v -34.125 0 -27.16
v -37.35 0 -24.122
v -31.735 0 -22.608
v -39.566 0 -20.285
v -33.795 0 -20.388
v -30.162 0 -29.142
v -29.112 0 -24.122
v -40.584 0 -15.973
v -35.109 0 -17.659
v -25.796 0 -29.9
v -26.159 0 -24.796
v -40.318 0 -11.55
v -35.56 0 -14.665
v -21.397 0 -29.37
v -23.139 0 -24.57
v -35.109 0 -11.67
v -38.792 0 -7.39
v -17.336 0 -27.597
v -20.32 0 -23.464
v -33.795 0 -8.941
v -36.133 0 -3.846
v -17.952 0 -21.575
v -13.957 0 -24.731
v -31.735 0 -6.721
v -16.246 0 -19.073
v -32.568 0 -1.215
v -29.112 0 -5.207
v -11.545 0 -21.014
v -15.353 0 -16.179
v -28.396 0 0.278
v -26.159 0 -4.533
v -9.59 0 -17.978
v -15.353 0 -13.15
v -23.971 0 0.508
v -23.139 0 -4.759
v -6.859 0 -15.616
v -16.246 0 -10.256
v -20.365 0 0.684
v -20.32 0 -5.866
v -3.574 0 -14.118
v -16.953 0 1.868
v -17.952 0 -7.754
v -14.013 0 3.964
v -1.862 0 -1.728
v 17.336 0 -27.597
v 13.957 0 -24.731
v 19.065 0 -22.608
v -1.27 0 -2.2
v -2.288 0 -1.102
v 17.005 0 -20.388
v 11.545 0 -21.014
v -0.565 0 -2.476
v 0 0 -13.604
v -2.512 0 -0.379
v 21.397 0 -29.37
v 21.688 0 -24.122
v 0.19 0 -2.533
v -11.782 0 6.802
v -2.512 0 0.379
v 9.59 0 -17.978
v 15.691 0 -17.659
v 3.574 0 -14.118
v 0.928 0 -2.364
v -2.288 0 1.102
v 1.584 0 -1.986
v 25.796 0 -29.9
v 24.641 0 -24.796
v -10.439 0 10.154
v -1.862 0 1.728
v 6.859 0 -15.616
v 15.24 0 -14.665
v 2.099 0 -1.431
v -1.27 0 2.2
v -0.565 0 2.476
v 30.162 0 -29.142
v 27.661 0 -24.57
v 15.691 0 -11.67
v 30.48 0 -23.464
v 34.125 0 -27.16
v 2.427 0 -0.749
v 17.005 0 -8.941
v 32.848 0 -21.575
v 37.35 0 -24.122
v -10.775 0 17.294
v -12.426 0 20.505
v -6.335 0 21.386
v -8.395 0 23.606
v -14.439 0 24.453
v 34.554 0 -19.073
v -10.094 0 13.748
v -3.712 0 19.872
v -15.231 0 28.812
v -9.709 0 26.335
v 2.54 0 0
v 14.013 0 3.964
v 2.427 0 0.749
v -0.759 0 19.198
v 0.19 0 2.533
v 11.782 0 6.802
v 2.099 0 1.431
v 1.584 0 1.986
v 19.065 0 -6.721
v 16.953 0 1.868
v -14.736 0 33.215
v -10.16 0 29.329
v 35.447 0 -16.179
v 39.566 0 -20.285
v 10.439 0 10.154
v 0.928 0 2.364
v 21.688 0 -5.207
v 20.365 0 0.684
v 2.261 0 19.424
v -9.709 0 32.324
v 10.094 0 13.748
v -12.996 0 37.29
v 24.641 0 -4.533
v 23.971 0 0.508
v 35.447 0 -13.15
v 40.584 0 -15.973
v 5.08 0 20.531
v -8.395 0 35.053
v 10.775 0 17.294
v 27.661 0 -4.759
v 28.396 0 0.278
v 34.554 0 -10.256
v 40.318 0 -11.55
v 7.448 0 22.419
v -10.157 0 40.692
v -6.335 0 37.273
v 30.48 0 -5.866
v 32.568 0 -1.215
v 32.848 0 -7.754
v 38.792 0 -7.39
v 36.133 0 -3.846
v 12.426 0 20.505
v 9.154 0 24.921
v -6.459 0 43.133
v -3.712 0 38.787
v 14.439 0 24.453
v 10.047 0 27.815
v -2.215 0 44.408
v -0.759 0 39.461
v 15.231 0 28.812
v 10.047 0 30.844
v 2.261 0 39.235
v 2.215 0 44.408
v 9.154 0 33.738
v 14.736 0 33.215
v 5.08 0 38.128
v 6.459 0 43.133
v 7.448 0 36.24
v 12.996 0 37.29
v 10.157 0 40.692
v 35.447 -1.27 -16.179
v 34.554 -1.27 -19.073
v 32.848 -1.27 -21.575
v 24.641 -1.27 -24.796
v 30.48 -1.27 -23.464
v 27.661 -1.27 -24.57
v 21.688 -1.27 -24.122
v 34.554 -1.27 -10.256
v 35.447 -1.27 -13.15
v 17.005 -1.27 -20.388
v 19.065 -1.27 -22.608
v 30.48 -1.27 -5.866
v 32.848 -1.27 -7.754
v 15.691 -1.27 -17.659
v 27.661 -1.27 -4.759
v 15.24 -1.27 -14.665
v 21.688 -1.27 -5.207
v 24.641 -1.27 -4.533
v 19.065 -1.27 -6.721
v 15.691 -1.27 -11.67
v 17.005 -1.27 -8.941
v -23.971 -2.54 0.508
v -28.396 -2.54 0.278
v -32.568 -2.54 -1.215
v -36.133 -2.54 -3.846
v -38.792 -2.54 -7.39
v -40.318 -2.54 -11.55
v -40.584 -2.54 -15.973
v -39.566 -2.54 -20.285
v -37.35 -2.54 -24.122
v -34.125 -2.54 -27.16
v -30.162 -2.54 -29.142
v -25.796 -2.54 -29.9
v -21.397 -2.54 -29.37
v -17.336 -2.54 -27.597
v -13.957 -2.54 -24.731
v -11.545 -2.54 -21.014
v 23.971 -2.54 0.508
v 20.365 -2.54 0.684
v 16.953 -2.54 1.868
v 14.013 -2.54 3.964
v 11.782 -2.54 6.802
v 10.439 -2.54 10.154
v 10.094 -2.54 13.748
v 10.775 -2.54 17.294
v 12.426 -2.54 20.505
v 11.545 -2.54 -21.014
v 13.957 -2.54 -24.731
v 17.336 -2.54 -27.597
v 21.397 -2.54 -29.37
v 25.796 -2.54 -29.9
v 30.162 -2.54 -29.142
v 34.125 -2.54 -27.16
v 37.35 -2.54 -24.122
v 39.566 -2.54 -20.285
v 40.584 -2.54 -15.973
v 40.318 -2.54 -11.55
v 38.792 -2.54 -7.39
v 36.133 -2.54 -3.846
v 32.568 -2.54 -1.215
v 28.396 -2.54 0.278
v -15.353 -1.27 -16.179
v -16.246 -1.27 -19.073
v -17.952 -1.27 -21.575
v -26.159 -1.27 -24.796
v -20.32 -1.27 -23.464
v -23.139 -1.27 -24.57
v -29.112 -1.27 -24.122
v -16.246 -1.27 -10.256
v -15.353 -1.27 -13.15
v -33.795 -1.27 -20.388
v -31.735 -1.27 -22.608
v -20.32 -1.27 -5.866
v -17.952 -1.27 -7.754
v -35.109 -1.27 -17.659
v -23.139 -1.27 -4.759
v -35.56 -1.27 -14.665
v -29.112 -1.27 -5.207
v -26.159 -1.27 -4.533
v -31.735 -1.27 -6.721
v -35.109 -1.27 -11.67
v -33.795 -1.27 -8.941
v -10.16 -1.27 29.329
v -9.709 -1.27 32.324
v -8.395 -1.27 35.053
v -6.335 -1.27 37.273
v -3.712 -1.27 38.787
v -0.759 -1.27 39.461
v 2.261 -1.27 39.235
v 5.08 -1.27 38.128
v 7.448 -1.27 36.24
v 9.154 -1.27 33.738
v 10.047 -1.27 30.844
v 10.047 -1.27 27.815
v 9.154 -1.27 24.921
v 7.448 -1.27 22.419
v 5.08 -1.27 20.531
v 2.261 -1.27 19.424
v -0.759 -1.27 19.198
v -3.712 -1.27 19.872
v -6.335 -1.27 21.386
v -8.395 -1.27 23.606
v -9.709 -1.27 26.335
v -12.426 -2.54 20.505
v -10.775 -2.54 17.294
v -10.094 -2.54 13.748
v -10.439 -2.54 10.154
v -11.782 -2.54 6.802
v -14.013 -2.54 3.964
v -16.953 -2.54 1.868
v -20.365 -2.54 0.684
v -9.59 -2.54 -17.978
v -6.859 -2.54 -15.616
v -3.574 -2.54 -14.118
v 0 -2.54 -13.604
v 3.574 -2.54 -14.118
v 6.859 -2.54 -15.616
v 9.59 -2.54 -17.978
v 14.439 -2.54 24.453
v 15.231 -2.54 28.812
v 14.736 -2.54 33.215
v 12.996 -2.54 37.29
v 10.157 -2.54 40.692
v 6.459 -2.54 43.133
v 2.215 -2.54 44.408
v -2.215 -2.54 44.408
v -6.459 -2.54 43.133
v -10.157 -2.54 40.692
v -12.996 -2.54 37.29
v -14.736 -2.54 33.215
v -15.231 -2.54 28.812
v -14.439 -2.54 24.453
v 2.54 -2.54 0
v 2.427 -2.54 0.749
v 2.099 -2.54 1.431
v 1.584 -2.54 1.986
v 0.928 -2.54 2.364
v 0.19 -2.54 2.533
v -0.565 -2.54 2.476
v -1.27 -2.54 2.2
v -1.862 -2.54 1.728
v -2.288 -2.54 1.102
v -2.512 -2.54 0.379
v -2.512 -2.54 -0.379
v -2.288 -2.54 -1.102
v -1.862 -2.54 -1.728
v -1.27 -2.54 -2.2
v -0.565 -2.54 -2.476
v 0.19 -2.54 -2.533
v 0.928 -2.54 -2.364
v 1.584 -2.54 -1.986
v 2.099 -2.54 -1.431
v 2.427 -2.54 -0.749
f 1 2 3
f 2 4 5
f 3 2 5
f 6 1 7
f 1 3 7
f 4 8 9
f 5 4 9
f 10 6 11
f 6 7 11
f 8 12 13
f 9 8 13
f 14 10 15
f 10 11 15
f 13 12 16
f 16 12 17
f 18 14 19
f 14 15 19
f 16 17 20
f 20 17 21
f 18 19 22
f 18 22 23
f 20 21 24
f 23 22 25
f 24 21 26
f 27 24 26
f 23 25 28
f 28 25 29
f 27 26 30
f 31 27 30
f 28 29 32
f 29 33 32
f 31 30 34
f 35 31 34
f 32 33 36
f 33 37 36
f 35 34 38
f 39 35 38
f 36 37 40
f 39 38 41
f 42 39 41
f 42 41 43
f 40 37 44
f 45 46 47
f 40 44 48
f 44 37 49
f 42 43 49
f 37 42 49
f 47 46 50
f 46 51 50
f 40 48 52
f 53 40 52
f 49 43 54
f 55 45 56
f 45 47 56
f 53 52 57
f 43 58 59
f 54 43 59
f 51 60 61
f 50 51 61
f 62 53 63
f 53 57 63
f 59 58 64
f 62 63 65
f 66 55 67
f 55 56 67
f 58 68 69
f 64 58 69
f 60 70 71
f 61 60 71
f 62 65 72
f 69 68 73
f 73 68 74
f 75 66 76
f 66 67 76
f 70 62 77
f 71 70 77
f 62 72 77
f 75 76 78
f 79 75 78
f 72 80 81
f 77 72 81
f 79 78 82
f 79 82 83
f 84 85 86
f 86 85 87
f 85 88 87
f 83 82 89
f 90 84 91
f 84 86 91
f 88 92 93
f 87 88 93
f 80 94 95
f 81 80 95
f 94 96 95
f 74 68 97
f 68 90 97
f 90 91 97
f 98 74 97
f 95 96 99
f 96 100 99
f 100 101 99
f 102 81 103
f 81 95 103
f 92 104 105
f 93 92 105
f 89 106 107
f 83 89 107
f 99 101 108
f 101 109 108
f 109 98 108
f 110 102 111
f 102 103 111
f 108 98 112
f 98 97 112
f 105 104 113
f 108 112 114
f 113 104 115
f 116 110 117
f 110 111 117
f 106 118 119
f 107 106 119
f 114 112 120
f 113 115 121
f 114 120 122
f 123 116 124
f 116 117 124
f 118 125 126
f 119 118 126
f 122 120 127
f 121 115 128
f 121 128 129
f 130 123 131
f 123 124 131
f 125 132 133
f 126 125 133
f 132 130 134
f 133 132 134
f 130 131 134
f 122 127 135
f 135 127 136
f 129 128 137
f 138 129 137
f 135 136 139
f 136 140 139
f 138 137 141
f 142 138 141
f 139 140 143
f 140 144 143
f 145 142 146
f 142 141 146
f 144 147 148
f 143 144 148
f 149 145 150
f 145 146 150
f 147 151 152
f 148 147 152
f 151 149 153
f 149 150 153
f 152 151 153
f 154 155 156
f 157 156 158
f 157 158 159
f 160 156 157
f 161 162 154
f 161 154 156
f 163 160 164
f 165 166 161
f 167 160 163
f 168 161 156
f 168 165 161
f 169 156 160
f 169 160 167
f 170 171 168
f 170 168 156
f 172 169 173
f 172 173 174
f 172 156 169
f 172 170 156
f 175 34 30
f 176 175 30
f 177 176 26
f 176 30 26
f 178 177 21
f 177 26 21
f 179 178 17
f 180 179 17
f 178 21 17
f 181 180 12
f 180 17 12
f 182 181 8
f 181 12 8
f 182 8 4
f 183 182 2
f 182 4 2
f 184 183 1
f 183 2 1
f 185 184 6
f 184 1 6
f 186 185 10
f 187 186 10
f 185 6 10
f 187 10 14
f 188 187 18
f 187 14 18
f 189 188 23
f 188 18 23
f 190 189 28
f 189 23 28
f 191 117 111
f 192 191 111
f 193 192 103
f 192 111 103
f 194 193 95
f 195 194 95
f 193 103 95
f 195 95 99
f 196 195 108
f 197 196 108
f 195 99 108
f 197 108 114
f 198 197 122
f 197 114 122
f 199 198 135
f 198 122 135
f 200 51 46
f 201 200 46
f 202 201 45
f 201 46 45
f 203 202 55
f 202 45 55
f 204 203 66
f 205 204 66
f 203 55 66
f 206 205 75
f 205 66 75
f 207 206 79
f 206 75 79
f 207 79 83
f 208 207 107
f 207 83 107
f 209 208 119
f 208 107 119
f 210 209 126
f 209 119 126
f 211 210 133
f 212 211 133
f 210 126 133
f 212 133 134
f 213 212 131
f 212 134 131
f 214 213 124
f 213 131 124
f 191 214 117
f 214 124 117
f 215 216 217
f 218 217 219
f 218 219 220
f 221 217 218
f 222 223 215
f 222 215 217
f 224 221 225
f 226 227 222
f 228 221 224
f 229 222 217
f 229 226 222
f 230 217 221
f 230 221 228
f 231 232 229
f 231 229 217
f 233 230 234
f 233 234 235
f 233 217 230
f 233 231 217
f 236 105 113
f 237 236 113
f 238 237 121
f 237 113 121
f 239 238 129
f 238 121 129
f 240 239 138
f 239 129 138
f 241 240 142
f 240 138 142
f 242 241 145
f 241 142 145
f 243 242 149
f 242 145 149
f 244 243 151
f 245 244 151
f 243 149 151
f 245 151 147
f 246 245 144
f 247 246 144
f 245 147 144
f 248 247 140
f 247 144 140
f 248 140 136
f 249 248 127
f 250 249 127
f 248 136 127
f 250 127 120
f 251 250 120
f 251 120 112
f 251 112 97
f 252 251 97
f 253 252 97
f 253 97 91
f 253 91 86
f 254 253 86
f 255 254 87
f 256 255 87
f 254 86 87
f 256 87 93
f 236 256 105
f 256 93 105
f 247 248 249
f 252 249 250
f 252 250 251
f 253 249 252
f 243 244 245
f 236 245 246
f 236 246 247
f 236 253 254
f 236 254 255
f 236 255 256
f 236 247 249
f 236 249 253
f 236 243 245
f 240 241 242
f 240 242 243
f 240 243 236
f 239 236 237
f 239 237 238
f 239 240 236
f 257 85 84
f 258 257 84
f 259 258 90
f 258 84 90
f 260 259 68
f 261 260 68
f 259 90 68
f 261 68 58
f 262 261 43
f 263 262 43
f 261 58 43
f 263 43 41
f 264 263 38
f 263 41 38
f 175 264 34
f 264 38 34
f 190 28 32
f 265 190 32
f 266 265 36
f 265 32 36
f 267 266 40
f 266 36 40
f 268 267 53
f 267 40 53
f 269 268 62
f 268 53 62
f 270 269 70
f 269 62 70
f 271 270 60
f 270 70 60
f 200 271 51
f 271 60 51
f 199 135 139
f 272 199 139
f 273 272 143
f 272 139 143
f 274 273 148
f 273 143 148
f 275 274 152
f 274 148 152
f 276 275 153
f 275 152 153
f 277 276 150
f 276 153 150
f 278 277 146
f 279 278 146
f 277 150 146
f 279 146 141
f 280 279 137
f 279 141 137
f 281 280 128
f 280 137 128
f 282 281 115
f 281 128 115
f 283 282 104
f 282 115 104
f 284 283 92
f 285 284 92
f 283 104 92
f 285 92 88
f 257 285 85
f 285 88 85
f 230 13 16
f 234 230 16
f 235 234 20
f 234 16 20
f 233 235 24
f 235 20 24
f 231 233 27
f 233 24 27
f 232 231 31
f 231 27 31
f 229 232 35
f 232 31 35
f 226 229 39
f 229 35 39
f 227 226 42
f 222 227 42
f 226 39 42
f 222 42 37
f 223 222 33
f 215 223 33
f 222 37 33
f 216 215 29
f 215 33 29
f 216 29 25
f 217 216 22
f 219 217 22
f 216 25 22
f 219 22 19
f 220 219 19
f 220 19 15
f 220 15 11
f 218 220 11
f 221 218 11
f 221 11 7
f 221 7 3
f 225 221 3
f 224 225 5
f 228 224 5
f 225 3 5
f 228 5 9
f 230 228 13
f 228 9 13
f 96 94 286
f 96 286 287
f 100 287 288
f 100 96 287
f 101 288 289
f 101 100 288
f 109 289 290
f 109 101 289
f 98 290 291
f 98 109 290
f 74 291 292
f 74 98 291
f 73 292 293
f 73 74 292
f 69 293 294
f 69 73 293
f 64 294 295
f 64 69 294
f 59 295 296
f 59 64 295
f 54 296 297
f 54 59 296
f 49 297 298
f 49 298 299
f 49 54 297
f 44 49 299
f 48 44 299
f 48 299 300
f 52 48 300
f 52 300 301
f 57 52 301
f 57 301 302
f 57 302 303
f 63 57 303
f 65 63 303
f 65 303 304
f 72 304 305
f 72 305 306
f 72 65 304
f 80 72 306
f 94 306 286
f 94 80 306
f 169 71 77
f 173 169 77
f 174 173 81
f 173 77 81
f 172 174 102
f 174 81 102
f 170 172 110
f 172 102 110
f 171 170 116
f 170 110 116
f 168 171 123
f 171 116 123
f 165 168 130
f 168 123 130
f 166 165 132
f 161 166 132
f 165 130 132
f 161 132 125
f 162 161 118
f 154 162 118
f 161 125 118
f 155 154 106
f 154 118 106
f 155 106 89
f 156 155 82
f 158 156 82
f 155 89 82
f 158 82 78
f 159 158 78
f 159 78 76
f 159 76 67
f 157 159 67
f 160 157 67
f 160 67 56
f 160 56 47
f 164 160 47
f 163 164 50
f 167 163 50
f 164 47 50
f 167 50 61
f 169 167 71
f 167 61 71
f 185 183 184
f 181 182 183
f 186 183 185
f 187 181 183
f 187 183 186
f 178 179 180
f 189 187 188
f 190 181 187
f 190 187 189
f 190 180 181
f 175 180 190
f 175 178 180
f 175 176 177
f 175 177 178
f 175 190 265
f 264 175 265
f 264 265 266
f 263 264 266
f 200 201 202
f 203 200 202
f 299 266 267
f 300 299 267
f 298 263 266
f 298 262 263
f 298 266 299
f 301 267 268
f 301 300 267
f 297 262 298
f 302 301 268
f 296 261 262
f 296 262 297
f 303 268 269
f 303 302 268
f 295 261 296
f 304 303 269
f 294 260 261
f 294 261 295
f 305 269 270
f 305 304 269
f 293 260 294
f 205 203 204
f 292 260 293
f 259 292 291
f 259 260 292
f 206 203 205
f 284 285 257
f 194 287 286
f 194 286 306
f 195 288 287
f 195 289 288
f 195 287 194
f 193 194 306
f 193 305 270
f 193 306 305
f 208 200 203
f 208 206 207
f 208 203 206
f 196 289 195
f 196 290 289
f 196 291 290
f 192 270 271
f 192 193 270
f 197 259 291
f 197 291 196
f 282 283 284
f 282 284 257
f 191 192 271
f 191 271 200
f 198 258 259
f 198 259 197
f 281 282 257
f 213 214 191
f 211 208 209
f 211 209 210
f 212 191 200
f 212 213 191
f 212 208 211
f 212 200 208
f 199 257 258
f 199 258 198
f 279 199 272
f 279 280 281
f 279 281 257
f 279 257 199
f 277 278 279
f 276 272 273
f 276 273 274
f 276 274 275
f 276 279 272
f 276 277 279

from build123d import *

# Parameters (mm, degrees)
F0_R     = 2.54
F1_DEPTH = 2.54
F2_R     = 10.16
F3_DEPTH = 1.27


# Not quite as in the source:
# - a feature names something its author has since deleted; it is built from what else it names


with BuildPart() as f1:
    # F0 (on Front) → F1 (new body)
    with BuildSketch(Plane.XZ):
        with BuildLine():
            ThreePointArc((23.9710795428, 0.5081666473), (11.7817898671, 6.8022195513), (12.4256249974, 20.5054805165))
            ThreePointArc((12.4256249974, 20.5054805165), (0, 44.5693936748), (-12.4256249974, 20.5054805165))
            ThreePointArc((-12.4256249974, 20.5054805165), (-11.7817898671, 6.8022195513), (-23.9710795428, 0.5081666473))
            ThreePointArc((-23.9710795428, 0.5081666473), (-38.5982271537, -22.2846968374), (-11.5454545455, -21.0136471639))
            ThreePointArc((-11.5454545455, -21.0136471639), (0, -13.6044391026), (11.5454545455, -21.0136471639))
            ThreePointArc((11.5454545455, -21.0136471639), (38.5982271537, -22.2846968374), (23.9710795428, 0.5081666473))
        make_face()
        Circle(F0_R, mode=Mode.SUBTRACT)
    extrude(amount=F1_DEPTH)

    # F2 (on face) → F3 (cut)
    with BuildSketch(Plane(origin=(0, 0, 0), x_dir=(-1, 0, 0), z_dir=(0, 1, 0))):
        with Locations((25.4, -14.6646968374)):
            Circle(F2_R)
        with Locations((0, 29.3293936748)):
            Circle(F2_R)
        with Locations((-25.4, -14.6646968374)):
            Circle(F2_R)
    extrude(amount=-F3_DEPTH, mode=Mode.SUBTRACT)


solid = f1.part
